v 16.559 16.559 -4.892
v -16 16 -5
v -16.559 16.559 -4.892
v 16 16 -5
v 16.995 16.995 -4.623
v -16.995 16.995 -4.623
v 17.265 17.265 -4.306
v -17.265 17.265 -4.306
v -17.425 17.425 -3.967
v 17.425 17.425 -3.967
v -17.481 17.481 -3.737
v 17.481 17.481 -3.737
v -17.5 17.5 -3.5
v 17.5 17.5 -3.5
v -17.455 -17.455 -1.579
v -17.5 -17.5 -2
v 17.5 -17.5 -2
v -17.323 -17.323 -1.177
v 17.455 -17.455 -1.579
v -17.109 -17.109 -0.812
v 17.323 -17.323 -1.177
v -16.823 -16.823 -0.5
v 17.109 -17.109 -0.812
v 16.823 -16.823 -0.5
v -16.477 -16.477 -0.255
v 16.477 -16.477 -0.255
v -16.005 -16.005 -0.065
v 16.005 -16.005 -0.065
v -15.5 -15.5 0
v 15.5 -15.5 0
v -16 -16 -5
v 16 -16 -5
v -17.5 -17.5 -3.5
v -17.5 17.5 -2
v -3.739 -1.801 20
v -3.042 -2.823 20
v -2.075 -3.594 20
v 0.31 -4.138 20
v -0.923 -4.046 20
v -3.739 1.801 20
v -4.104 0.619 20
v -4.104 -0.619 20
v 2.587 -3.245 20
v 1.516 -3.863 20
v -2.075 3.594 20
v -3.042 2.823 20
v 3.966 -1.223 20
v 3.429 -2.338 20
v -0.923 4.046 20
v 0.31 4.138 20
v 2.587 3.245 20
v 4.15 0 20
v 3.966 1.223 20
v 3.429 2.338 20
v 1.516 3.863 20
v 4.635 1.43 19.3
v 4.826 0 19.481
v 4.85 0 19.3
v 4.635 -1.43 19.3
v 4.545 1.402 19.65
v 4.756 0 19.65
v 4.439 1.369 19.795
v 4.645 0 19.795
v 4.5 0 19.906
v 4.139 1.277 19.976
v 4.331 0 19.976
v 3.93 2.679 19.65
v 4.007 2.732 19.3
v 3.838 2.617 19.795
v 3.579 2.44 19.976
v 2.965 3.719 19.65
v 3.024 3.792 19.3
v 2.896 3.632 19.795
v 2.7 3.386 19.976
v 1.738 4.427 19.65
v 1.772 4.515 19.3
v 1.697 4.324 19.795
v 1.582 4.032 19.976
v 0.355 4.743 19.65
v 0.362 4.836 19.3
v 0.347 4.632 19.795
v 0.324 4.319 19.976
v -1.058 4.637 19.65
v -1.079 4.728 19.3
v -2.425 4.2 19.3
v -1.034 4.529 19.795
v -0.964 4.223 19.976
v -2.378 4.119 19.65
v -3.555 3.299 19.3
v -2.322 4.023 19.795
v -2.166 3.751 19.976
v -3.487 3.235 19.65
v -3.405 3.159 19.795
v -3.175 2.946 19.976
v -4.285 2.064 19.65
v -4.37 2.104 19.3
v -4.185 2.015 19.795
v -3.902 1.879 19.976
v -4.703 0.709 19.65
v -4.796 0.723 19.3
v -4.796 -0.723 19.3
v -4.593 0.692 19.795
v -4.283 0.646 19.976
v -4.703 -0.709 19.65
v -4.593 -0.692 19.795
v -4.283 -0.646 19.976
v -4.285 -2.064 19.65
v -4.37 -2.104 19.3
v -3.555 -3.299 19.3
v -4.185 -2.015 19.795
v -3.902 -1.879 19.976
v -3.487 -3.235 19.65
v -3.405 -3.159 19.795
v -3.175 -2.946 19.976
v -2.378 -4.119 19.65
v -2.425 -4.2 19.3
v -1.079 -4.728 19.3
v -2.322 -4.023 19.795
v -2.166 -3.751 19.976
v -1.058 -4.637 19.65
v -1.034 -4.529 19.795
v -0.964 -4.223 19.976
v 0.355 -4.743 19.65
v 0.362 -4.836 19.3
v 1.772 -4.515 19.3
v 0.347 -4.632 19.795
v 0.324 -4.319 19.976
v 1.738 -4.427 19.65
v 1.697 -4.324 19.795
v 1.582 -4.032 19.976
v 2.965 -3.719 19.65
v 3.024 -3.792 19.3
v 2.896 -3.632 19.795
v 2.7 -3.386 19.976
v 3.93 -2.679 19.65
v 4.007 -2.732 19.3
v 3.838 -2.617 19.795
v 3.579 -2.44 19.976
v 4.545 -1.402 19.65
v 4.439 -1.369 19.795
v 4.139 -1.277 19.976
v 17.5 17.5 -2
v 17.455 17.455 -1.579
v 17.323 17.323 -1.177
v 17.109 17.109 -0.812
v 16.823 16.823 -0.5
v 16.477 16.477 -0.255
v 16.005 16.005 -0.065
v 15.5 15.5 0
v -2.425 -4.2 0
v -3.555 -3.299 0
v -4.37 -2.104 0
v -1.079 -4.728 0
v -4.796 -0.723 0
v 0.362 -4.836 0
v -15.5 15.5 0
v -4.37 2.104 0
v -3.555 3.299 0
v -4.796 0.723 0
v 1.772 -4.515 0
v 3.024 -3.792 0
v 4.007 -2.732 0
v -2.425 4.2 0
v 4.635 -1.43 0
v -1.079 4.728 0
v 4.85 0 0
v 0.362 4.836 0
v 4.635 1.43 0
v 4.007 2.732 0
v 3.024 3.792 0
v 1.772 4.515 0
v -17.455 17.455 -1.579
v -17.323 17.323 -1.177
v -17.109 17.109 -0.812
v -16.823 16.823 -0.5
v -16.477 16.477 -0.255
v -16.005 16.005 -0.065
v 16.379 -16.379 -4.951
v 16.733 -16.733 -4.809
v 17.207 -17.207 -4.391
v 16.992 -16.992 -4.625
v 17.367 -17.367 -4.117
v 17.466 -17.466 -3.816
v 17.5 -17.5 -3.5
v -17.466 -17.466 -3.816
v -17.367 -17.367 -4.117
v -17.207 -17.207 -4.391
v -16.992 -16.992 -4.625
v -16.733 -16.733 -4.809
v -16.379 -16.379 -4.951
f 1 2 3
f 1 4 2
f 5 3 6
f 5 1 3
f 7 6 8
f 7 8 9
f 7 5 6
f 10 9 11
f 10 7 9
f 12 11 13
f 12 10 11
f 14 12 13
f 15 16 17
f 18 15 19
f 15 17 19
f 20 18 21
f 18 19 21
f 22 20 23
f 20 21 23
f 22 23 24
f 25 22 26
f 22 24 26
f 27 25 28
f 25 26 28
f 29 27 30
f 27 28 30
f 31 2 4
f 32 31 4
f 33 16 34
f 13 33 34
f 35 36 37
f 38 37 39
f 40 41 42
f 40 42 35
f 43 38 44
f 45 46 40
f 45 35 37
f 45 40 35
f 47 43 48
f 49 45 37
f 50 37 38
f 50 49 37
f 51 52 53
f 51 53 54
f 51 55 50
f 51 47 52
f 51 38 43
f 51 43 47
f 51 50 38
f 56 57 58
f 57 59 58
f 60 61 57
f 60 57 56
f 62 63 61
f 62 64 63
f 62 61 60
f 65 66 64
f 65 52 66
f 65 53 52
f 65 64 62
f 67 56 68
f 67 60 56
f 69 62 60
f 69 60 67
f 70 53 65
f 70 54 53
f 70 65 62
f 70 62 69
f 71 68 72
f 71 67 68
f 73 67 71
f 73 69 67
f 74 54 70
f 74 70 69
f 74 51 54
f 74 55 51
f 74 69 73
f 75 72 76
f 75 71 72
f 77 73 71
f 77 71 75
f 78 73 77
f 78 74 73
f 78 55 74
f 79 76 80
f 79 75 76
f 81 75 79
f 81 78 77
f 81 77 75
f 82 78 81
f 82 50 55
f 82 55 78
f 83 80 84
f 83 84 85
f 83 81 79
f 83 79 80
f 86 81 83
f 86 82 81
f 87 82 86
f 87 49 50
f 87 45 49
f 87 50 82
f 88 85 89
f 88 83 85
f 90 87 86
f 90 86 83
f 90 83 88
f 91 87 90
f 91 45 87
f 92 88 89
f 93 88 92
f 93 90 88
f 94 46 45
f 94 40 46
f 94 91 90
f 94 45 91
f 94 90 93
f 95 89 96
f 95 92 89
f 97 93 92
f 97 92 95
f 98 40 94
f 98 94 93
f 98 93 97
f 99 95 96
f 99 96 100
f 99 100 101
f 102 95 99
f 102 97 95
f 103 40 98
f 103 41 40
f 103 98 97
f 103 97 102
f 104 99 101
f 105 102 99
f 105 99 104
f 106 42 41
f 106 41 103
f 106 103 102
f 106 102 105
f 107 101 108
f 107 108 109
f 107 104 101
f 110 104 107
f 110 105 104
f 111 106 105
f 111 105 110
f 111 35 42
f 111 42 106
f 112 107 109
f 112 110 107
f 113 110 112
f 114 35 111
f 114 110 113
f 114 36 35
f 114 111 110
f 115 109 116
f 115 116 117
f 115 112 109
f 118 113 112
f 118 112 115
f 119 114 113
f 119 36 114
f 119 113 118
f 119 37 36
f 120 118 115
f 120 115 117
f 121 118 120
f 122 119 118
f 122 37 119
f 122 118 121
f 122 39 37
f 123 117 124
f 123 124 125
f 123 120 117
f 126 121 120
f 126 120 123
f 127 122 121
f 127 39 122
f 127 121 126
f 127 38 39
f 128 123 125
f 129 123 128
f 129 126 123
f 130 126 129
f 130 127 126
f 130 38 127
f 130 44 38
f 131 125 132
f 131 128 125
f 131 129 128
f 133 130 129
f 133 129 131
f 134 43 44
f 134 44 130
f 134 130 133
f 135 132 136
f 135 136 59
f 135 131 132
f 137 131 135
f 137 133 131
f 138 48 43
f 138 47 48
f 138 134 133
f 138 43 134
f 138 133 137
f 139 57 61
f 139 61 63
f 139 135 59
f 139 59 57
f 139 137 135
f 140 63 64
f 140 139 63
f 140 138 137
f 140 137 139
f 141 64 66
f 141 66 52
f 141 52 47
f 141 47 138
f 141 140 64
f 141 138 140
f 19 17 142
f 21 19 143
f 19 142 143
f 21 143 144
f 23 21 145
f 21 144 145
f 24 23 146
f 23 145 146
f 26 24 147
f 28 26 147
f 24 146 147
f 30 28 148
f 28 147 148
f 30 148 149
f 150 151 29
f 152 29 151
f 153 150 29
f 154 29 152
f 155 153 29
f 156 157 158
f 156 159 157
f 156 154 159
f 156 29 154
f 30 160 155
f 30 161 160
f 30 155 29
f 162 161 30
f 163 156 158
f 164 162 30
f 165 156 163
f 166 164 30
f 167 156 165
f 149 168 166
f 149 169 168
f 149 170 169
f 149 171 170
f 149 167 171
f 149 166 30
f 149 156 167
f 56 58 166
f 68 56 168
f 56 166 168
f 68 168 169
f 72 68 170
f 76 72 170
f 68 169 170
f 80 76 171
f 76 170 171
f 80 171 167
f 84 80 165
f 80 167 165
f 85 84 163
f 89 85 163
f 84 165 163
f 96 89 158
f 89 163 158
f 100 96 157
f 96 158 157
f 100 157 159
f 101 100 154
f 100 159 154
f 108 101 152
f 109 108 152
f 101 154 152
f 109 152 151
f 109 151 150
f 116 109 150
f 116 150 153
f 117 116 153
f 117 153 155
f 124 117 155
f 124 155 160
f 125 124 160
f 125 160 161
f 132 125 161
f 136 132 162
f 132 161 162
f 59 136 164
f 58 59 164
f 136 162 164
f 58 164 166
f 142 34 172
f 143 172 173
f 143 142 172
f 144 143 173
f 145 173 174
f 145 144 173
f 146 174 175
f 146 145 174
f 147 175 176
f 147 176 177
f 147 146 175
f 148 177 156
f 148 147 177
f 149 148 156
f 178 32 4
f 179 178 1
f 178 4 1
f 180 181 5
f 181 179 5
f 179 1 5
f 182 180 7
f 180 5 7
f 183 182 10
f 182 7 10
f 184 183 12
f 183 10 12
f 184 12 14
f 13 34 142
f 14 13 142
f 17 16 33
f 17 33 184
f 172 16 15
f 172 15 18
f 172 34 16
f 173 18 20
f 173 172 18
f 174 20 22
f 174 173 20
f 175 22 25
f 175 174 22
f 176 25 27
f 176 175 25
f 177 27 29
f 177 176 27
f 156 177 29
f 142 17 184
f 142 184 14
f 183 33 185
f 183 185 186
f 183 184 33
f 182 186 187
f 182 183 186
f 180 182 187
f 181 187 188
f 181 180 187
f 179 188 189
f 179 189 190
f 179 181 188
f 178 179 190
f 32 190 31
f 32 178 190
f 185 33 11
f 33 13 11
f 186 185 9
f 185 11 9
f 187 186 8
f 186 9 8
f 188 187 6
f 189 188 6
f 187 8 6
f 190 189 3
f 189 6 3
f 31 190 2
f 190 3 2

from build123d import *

# Parameters (mm, degrees)
F0_W     = 35
F0_H     = 35
F1_DEPTH = 5
F3_R     = 2
F4_R     = 1.5
F2_R     = 4.85
F5_DEPTH = 20
F6_R     = 0.7


with BuildPart() as f1:
    # F0 (on Top) → F1 (new body)
    with BuildSketch(Plane.XY):
        Rectangle(F0_W, F0_H)
    extrude(amount=-F1_DEPTH)

    # F3
    f3_edges = [f1.edges().sort_by_distance(p)[0] for p in [
        (0, -17.5, 0),
        (-17.5, 0, 0),
        (0, 17.5, 0),
        (17.5, 0, 0),
    ]]
    fillet(f3_edges, radius=F3_R)

    # F4
    f4_edges = [f1.edges().sort_by_distance(p)[0] for p in [
        (0, 17.5, -5),
        (-17.5, 0, -5),
        (0, -17.5, -5),
        (17.5, 0, -5),
    ]]
    fillet(f4_edges, radius=F4_R)

    # F2 (on Top) → F5 (join)
    with BuildSketch(Plane.XY):
        Circle(F2_R)
    extrude(amount=F5_DEPTH)

    # F6
    f6_edges = [f1.edges().sort_by_distance(p)[0] for p in [
        (-4.85, 0, 20),
    ]]
    fillet(f6_edges, radius=F6_R)


solid = f1.part
